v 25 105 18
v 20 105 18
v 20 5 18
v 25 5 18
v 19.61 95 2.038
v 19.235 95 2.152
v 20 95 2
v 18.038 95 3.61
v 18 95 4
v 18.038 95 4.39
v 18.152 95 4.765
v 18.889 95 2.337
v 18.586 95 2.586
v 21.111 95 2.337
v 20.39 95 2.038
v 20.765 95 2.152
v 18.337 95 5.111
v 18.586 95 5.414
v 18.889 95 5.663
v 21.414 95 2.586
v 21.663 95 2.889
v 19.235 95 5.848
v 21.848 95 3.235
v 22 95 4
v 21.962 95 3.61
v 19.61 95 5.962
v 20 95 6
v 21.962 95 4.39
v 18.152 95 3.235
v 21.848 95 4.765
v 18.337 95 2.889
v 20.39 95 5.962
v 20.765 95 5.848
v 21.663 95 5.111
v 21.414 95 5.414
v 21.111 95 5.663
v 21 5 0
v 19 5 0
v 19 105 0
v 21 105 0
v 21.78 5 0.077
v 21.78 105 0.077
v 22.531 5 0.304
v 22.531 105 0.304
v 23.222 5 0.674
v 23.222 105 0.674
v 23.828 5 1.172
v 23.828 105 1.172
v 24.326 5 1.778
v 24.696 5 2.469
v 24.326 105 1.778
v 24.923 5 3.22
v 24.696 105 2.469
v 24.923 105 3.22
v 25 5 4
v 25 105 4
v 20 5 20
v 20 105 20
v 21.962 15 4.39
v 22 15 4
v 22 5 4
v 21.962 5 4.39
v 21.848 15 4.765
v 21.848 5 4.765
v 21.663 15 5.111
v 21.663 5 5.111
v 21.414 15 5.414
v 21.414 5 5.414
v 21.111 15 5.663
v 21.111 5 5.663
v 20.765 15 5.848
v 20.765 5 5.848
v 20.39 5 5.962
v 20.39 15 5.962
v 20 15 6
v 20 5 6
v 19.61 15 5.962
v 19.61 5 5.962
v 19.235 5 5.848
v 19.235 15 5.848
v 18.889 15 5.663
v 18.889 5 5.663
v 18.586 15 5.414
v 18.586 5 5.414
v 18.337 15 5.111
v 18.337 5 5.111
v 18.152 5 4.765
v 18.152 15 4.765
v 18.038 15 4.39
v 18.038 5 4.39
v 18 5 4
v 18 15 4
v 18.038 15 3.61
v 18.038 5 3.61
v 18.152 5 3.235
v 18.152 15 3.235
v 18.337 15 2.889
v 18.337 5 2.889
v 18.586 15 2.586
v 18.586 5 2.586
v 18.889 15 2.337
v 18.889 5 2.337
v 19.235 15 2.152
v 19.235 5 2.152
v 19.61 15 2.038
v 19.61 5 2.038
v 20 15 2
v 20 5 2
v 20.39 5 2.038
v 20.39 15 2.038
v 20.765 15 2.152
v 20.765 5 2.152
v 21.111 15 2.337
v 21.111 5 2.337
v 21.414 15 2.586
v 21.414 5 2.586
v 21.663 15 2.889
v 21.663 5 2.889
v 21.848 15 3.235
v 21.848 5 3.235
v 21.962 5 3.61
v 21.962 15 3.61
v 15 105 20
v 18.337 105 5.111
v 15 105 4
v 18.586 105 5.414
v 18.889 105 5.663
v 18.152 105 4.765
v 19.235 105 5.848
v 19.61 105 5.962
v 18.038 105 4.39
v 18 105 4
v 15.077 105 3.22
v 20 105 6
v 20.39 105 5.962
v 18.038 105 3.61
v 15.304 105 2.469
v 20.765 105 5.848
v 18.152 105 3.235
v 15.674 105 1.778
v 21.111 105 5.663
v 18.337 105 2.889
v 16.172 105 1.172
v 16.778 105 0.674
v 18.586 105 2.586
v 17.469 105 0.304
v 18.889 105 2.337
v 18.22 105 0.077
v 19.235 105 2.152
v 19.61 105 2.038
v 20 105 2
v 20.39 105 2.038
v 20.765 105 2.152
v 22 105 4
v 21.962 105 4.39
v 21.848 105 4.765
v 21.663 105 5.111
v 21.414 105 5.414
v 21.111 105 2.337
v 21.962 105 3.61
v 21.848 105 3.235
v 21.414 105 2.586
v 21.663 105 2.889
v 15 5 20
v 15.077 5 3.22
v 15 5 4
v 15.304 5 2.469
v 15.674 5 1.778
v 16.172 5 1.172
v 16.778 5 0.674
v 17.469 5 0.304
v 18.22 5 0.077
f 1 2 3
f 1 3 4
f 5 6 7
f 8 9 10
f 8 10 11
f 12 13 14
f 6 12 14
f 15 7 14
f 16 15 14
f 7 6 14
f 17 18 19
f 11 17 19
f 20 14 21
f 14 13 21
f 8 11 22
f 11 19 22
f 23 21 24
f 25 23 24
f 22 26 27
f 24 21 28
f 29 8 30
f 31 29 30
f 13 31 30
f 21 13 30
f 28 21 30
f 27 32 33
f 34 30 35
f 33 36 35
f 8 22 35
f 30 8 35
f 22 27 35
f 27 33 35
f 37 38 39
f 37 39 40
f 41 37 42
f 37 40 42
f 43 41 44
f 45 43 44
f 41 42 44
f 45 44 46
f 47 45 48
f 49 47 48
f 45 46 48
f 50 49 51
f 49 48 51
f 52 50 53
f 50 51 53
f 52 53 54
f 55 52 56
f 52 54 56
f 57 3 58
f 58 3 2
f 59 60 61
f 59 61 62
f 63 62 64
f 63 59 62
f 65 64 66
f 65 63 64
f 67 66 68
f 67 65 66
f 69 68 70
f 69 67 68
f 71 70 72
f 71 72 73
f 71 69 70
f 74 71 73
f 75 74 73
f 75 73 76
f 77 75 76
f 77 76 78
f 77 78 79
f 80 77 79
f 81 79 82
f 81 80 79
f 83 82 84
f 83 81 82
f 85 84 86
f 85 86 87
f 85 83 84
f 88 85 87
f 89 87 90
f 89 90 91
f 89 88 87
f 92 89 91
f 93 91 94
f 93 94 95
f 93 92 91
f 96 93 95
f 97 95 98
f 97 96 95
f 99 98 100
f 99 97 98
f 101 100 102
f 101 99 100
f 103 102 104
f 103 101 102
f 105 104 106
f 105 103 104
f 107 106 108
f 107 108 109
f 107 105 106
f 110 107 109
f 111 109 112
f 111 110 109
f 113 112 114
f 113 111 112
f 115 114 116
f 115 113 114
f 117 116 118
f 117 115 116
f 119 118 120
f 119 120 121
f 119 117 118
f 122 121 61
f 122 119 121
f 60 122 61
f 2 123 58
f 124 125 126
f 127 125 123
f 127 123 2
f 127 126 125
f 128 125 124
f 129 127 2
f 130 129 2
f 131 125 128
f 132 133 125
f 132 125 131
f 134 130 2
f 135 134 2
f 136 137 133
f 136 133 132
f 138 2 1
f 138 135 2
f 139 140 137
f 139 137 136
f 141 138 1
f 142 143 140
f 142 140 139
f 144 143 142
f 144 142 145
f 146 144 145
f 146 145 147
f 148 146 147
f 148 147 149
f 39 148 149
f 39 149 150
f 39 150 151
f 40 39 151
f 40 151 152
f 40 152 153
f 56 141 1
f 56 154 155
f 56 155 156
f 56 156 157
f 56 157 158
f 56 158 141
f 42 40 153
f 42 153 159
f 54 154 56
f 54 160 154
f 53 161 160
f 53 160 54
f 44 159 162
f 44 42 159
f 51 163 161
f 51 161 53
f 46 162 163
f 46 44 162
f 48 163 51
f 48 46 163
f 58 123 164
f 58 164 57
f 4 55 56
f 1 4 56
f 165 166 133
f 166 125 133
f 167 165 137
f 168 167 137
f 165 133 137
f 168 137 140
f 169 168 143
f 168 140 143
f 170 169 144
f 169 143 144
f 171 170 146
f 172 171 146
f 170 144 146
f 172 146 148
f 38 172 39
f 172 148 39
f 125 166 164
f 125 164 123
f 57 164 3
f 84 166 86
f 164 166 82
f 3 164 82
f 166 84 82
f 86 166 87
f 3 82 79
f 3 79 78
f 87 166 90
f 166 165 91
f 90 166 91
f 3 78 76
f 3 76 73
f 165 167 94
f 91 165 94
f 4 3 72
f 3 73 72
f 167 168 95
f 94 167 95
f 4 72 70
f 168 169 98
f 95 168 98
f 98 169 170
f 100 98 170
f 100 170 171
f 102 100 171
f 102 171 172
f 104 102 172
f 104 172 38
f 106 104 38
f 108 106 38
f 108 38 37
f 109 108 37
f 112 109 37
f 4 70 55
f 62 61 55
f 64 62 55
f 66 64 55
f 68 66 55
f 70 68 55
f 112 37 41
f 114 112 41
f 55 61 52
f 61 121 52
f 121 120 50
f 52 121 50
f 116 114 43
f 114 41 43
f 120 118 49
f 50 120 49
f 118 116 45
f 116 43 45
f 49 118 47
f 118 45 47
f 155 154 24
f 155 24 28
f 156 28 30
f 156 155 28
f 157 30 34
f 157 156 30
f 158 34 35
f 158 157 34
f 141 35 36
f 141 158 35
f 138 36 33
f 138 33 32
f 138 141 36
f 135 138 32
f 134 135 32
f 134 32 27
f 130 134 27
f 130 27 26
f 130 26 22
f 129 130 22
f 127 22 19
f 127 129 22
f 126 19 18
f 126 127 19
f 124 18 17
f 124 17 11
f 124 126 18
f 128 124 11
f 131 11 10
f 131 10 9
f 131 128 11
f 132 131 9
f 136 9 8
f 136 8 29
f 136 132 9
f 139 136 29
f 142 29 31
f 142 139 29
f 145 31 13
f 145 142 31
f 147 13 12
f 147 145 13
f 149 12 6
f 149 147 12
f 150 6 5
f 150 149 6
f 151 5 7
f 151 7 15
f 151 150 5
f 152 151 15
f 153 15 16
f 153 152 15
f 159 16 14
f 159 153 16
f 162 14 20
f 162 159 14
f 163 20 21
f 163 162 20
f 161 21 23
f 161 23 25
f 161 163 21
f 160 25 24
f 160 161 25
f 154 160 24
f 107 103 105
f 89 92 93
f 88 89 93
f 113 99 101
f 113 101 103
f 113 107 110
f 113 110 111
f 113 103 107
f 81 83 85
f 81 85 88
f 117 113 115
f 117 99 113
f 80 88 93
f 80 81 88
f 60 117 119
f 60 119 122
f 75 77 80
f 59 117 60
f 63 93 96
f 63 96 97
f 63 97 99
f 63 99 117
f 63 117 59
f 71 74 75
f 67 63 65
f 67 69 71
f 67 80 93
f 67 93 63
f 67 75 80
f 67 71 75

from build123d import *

# Parameters (mm, degrees)
CYLINDER003_R     = 2
CYLINDER003_DEPTH = 10
CYLINDER002_R     = 2
CYLINDER002_DEPTH = 10
BOX003_W          = 5
BOX003_H          = 100
BOX003_DEPTH      = 2
BOX_W             = 10
BOX_H             = 100
BOX_DEPTH         = 20
FILLET_R          = 4
FILLET001_R       = 4


with BuildPart() as m3threadhole001:
    # Cylinder003 → Cylinder003 (new body)
    with BuildSketch(Plane(origin=(20, 105, 4), x_dir=(1, 0, 0), z_dir=(0, -1, 0))):
        Circle(CYLINDER003_R)
    extrude(amount=CYLINDER003_DEPTH)


with BuildPart() as fusion001:
    # Cylinder002 → Cylinder002 (new body)
    with BuildSketch(Plane(origin=(20, 15, 4), x_dir=(1, 0, 0), z_dir=(0, -1, 0))):
        Circle(CYLINDER002_R)
    extrude(amount=CYLINDER002_DEPTH)

    # Fusion001: union M3ThreadHole001
    add(m3threadhole001.part)


with BuildPart() as clampstep:
    # Box003 → Box003 (new body)
    with BuildSketch(Plane(origin=(20, 5, 18), x_dir=(1, 0, 0), z_dir=(0, 0, 1))):
        with Locations((2.5, 50)):
            Rectangle(BOX003_W, BOX003_H)
    extrude(amount=BOX003_DEPTH)


with BuildPart() as clampwithrounding:
    # Box → Box (new body)
    with BuildSketch(Plane(origin=(15, 5, 0), x_dir=(1, 0, 0), z_dir=(0, 0, 1))):
        with Locations((5, 50)):
            Rectangle(BOX_W, BOX_H)
    extrude(amount=BOX_DEPTH)

    # Cut002: cut ClampStep
    add(clampstep.part, mode=Mode.SUBTRACT)

    # Cut003: cut Fusion001
    add(fusion001.part, mode=Mode.SUBTRACT)

    # Fillet
    fillet_edges = [clampwithrounding.edges().sort_by_distance(p)[0] for p in [
        (15, 55, 0),
    ]]
    fillet(fillet_edges, radius=FILLET_R)

    # Fillet001
    fillet001_edges = [clampwithrounding.edges().sort_by_distance(p)[0] for p in [
        (25, 55, 0),
    ]]
    fillet(fillet001_edges, radius=FILLET001_R)


solid = clampwithrounding.part
